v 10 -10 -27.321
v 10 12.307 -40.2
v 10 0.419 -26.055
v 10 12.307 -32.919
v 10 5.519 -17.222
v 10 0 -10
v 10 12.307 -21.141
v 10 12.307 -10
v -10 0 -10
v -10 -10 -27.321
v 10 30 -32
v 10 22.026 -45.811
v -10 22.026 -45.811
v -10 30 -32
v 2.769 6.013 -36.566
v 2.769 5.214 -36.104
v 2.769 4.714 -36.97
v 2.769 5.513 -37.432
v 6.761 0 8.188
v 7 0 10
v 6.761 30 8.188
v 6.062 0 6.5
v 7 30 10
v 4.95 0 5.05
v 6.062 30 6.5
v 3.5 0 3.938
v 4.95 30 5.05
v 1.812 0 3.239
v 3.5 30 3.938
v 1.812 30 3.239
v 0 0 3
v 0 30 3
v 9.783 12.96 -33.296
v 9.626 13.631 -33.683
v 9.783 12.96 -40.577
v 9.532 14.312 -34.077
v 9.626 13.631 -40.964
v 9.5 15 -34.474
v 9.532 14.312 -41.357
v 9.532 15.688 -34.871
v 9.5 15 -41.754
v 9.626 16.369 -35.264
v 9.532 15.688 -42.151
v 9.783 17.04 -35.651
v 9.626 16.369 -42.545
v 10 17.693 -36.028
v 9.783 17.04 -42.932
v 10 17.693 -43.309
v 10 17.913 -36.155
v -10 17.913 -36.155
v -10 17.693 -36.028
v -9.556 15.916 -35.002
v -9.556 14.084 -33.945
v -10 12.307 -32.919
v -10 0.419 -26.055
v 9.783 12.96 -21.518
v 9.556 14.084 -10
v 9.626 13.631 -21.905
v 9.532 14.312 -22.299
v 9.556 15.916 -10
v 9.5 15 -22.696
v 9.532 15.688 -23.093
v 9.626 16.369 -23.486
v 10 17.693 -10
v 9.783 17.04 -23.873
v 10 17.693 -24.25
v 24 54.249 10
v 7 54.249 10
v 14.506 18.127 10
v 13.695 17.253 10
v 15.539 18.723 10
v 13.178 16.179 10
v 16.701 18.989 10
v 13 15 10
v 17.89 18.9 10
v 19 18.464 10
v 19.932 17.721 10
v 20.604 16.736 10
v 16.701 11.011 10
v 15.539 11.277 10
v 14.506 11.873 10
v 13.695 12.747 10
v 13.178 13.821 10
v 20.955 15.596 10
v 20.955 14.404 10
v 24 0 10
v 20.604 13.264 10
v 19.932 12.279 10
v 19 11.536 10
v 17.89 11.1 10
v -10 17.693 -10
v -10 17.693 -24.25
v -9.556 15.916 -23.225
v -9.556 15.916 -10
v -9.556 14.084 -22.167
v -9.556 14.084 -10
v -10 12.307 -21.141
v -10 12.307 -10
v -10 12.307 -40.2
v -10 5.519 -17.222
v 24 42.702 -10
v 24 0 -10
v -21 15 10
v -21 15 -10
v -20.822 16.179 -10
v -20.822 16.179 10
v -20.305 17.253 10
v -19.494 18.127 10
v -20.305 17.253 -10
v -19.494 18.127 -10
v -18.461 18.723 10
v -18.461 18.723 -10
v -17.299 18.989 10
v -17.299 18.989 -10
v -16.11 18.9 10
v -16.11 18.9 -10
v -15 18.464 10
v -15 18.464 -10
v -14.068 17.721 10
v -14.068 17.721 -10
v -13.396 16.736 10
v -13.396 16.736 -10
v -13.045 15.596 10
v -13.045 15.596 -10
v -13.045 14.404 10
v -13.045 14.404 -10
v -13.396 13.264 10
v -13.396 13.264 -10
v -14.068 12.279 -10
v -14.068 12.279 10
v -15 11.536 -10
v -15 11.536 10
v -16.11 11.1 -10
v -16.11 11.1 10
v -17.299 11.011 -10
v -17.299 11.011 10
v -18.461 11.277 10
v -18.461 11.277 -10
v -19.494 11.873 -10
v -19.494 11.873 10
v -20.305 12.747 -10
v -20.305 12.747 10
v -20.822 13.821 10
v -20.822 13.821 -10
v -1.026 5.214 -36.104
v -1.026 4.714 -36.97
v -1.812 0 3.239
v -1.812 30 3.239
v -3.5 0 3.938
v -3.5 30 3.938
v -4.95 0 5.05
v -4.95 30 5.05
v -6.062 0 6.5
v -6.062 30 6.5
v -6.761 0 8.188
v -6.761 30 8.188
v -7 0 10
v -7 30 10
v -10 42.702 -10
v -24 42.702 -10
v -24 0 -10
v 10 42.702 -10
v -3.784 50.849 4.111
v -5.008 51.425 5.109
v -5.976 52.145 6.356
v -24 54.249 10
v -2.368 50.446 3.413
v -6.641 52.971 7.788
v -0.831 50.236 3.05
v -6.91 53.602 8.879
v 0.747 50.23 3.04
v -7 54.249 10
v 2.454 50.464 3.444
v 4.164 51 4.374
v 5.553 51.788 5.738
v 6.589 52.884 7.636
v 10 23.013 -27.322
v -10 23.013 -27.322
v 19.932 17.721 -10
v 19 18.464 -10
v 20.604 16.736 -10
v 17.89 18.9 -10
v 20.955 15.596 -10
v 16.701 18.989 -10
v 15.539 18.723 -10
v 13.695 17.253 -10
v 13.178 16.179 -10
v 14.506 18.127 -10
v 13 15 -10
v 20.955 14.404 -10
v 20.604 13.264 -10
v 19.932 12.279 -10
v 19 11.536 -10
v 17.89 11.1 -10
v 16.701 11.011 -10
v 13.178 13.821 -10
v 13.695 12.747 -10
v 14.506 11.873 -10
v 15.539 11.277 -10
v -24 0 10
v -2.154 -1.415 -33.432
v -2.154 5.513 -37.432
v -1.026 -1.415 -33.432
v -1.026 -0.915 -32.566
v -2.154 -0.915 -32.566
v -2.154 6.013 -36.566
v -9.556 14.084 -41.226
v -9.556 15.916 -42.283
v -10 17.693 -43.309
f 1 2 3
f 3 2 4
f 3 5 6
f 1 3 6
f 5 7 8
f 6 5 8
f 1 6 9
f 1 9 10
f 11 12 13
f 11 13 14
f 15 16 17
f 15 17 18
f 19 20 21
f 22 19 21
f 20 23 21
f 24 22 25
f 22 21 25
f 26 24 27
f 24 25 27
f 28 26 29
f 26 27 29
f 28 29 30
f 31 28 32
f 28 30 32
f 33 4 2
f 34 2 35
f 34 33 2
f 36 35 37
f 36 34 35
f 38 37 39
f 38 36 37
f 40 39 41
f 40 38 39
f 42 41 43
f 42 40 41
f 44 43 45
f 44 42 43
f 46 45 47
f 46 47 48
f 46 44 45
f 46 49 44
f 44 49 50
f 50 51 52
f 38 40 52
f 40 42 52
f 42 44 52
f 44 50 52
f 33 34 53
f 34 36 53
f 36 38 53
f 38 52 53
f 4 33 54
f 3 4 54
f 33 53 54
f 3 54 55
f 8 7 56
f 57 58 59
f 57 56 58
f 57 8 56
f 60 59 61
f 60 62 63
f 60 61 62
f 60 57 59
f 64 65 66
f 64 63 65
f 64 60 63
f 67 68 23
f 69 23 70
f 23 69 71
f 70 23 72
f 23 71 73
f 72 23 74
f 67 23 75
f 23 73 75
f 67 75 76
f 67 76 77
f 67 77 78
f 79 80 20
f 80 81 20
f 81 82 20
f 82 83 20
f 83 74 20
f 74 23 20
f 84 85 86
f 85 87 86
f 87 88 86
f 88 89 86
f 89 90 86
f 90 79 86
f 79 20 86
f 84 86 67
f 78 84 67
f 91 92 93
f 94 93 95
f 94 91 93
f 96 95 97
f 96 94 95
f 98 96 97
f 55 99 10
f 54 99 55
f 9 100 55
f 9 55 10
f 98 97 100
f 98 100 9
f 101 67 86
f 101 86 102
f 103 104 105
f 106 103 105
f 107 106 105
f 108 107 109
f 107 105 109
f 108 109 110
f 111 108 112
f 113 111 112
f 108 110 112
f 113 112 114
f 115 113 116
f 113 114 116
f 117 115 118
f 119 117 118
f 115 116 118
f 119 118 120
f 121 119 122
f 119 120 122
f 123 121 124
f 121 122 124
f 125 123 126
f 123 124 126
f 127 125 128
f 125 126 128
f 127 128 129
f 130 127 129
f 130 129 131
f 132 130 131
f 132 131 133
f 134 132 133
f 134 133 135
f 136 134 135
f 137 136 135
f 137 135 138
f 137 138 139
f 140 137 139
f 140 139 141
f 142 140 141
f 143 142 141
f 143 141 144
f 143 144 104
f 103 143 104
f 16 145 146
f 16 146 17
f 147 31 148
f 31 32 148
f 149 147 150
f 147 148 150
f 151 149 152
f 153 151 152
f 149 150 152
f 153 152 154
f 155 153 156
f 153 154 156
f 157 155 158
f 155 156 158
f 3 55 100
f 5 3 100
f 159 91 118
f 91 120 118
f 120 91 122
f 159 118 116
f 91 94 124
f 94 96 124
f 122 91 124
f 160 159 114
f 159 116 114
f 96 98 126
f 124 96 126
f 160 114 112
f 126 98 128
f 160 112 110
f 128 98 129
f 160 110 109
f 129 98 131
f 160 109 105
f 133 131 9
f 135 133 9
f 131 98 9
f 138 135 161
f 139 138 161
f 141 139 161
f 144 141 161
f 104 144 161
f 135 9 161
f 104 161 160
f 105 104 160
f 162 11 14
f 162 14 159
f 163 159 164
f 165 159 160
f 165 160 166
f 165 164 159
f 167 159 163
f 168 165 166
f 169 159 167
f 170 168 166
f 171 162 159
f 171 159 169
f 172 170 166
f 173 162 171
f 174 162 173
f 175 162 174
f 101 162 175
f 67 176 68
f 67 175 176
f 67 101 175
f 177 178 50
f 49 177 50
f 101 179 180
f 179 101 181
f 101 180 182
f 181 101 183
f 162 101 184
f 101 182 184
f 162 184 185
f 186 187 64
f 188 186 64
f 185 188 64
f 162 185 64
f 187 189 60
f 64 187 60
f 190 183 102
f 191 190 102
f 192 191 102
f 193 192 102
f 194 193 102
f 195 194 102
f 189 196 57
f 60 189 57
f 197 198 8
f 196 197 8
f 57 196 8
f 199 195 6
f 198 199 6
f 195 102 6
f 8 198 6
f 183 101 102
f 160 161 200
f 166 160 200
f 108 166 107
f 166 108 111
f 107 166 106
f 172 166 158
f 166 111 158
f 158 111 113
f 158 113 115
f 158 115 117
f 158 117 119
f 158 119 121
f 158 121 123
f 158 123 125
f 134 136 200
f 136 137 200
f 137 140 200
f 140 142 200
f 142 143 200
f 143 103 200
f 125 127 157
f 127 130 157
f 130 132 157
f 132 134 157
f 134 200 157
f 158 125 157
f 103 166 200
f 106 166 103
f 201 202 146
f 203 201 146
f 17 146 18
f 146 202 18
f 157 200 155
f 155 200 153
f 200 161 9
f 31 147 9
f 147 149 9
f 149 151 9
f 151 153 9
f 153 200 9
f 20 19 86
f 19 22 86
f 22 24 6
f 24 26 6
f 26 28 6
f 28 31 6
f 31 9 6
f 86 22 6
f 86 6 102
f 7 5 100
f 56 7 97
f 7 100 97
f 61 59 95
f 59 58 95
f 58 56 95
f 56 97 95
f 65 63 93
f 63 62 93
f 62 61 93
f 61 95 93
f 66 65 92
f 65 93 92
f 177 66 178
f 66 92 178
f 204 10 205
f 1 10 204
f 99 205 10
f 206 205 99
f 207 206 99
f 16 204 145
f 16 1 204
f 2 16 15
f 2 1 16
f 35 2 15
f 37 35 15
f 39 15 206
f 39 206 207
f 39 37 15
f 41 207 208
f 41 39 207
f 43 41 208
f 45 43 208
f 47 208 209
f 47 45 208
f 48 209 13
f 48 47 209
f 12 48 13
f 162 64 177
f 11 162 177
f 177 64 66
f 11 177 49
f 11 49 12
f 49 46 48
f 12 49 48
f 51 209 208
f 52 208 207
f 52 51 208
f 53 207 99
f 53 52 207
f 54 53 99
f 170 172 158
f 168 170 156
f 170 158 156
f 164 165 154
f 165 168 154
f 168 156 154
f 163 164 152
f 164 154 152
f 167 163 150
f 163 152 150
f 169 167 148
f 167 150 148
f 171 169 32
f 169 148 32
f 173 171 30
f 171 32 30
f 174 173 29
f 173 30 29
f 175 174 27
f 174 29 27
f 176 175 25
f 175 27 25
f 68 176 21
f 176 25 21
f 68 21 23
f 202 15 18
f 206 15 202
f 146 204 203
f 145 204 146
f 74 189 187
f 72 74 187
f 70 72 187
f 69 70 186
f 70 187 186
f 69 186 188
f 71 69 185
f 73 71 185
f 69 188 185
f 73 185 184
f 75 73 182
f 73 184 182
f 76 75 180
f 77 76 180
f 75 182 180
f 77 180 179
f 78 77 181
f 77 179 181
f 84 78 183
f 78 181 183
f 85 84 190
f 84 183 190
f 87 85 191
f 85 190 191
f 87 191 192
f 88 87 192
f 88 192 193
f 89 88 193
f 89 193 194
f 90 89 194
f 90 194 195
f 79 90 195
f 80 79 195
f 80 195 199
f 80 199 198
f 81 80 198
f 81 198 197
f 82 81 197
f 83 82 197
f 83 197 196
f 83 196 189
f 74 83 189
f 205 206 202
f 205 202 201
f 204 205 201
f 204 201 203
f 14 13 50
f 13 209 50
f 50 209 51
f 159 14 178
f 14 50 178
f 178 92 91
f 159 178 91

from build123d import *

# Parameters (mm, degrees)
SKETCH_1_W              = 48
SKETCH_1_H              = 20
EXTRUDE_1_DEPTH         = 30
SKETCH_2_W              = 14
SKETCH_2_H              = 30
CUT_EXTRUDE_1_DEPTH     = 7
EXTRUDE_2_DEPTH         = 48
CUT_EXTRUDE_2_DEPTH     = 14
CUT_EXTRUDE_3_DEPTH     = 14
CUT_EXTRUDE_4_DEPTH     = 65.456478054
SKETCH_13_R             = 4
CUT_EXTRUDE_5_DEPTH     = 53.52066051
SKETCH_14_R             = 4
CUT_EXTRUDE_6_DEPTH     = 53.52066051
FILLET_1_R              = 7
EXTRUDE_5_DEPTH         = 1
SKETCH_20_R             = 7.5
CUT_EXTRUDE_8_DEPTH     = 53.52066051
BOSS_EXTRUDE1_DEPTH     = 25
CUT_EXTRUDE1_DEPTH      = 80.244164221
CUT_EXTRUDE1_DEPTH_BACK = 80.244164221


with BuildPart() as part:
    # Эскиз1 → Бобышка-Вытянуть1 (new body)
    with BuildSketch(Plane(origin=(0, 0, 0), x_dir=(1, 0, 0), z_dir=(0, 1, 0))):
        Rectangle(SKETCH_1_W, SKETCH_1_H)
    extrude(amount=EXTRUDE_1_DEPTH)

    # Эскиз2 → Вырез-Вытянуть1 (cut)
    with BuildSketch(Plane.XY.offset(10)):
        with Locations((0, 15)):
            Rectangle(SKETCH_2_W, SKETCH_2_H)
    extrude(amount=-CUT_EXTRUDE_1_DEPTH, mode=Mode.SUBTRACT)

    # Эскиз7 → Бобышка-Вытянуть2 (add)
    with BuildSketch(Plane(origin=(24, 0, 0), x_dir=(0, 0, -1), z_dir=(1, 0, 0))):
        Polygon((10, 0), (27.320508076, -10), (45.810889132, 22.026279442), (32, 30), (10, 30), align=None)
    extrude(amount=-EXTRUDE_2_DEPTH)

    # Эскиз8 → Вырез-Вытянуть2 (cut)
    with BuildSketch(Plane(origin=(24, 0, 0), x_dir=(0, 0, -1), z_dir=(1, 0, 0))):
        Polygon((10, 0), (10, 30), (32, 30), (45.810889132, 22.026279442), (27.320508076, -10), align=None)
    extrude(amount=-CUT_EXTRUDE_2_DEPTH, mode=Mode.SUBTRACT)

    # Эскиз9 → Вырез-Вытянуть3 (cut)
    with BuildSketch(Plane.ZY.offset(24)):
        Polygon((-10, 0), (-10, 30), (-32, 30), (-45.810889132, 22.026279442), (-27.320508076, -10), align=None)
    extrude(amount=-CUT_EXTRUDE_3_DEPTH, mode=Mode.SUBTRACT)

    # Эскиз11 → Вырез-Вытянуть4 (cut, through all)
    with BuildSketch(Plane.ZY.offset(10)):
        Polygon((-17.221869062, 5.518829477), (-27.321869062, 23.012542633), (-36.15532818, 17.912542633), (-26.05532818, 0.418829477), align=None)
    extrude(amount=-CUT_EXTRUDE_4_DEPTH, mode=Mode.SUBTRACT)

    # Эскиз13 → Вырез-Вытянуть5 (cut, through all)
    with BuildSketch(Plane(origin=(0, 0, -10), x_dir=(-1, 0, 0), z_dir=(0, 0, -1))):
        with Locations((17, 15)):
            Circle(SKETCH_13_R)
    extrude(amount=-CUT_EXTRUDE_5_DEPTH, mode=Mode.SUBTRACT)

    # Эскиз14 → Вырез-Вытянуть6 (cut, through all)
    with BuildSketch(Plane(origin=(0, 0, -10), x_dir=(-1, 0, 0), z_dir=(0, 0, -1))):
        with Locations((-17, 15)):
            Circle(SKETCH_14_R)
    extrude(amount=-CUT_EXTRUDE_6_DEPTH, mode=Mode.SUBTRACT)

    # Скругление1
    fillet_1_edges = [part.edges().sort_by_distance(p)[0] for p in [
        (-7, 15, 3),
        (7, 15, 3),
    ]]
    fillet(fillet_1_edges, radius=FILLET_1_R - 0.0001)  # a hair under: the kernel refuses the full size

    # Эскиз18 → Бобышка-Вытянуть5 (add)
    with BuildSketch(Plane(origin=(0, -14.330127019, -24.820508076), x_dir=(-1, 0, 0), z_dir=(0, -0.49999999999998845, -0.8660254037844453))):
        Polygon((2.153846154, 23.490381057), (2.153846154, 15.490381057), (1.025641026, 15.490381057), (1.025641026, 22.567304134), (-2.769230769, 22.567304134), (-2.769230769, 23.490381057), align=None)
    extrude(amount=EXTRUDE_5_DEPTH)

    # Эскиз20 → Вырез-Вытянуть8 (cut, through all)
    with BuildSketch(Plane(origin=(0, 0, -10), x_dir=(-1, 0, 0), z_dir=(0, 0, -1))):
        with Locations((-17, 15)):
            Circle(SKETCH_20_R)
        with Locations((17, 15)):
            Circle(SKETCH_20_R)
    extrude(amount=CUT_EXTRUDE_8_DEPTH, mode=Mode.SUBTRACT)

    # Sketch3 → Boss-Extrude1 (add)
    with BuildSketch(Plane(origin=(0, 30, 0), x_dir=(1, 0, 0), z_dir=(0, 1, 0))):
        with BuildLine():
            Line((7, -10), (24, -10))
            Line((24, -10), (24, 10))
            Line((24, 10), (10, 10))
            Line((10, 10), (10, 32))
            Line((10, 32), (-10, 32))
            Line((-10, 32), (-10, 10))
            Line((-10, 10), (-24, 10))
            Line((-24, 10), (-24, -10))
            Line((-24, -10), (-7, -10))
            ThreePointArc((-7, -10), (0, -3), (7, -10))
        make_face()
    extrude(amount=BOSS_EXTRUDE1_DEPTH)

    # Sketch4 → Cut-Extrude1 (cut, two sides: drawn at the far end of the back side and taken through both)
    with BuildSketch(Plane.ZY.offset(10).offset(-CUT_EXTRUDE1_DEPTH_BACK)):
        Polygon((-251.050138341, -96.468656337), (-45.810889132, 22.026279442), (35.63071017, 69.046608722), (240.869959379, 187.541544501), (3.880087821, 598.020042918), (-488.040009899, 314.00984208), align=None)
    extrude(amount=CUT_EXTRUDE1_DEPTH + CUT_EXTRUDE1_DEPTH_BACK, mode=Mode.SUBTRACT)


solid = part.part
